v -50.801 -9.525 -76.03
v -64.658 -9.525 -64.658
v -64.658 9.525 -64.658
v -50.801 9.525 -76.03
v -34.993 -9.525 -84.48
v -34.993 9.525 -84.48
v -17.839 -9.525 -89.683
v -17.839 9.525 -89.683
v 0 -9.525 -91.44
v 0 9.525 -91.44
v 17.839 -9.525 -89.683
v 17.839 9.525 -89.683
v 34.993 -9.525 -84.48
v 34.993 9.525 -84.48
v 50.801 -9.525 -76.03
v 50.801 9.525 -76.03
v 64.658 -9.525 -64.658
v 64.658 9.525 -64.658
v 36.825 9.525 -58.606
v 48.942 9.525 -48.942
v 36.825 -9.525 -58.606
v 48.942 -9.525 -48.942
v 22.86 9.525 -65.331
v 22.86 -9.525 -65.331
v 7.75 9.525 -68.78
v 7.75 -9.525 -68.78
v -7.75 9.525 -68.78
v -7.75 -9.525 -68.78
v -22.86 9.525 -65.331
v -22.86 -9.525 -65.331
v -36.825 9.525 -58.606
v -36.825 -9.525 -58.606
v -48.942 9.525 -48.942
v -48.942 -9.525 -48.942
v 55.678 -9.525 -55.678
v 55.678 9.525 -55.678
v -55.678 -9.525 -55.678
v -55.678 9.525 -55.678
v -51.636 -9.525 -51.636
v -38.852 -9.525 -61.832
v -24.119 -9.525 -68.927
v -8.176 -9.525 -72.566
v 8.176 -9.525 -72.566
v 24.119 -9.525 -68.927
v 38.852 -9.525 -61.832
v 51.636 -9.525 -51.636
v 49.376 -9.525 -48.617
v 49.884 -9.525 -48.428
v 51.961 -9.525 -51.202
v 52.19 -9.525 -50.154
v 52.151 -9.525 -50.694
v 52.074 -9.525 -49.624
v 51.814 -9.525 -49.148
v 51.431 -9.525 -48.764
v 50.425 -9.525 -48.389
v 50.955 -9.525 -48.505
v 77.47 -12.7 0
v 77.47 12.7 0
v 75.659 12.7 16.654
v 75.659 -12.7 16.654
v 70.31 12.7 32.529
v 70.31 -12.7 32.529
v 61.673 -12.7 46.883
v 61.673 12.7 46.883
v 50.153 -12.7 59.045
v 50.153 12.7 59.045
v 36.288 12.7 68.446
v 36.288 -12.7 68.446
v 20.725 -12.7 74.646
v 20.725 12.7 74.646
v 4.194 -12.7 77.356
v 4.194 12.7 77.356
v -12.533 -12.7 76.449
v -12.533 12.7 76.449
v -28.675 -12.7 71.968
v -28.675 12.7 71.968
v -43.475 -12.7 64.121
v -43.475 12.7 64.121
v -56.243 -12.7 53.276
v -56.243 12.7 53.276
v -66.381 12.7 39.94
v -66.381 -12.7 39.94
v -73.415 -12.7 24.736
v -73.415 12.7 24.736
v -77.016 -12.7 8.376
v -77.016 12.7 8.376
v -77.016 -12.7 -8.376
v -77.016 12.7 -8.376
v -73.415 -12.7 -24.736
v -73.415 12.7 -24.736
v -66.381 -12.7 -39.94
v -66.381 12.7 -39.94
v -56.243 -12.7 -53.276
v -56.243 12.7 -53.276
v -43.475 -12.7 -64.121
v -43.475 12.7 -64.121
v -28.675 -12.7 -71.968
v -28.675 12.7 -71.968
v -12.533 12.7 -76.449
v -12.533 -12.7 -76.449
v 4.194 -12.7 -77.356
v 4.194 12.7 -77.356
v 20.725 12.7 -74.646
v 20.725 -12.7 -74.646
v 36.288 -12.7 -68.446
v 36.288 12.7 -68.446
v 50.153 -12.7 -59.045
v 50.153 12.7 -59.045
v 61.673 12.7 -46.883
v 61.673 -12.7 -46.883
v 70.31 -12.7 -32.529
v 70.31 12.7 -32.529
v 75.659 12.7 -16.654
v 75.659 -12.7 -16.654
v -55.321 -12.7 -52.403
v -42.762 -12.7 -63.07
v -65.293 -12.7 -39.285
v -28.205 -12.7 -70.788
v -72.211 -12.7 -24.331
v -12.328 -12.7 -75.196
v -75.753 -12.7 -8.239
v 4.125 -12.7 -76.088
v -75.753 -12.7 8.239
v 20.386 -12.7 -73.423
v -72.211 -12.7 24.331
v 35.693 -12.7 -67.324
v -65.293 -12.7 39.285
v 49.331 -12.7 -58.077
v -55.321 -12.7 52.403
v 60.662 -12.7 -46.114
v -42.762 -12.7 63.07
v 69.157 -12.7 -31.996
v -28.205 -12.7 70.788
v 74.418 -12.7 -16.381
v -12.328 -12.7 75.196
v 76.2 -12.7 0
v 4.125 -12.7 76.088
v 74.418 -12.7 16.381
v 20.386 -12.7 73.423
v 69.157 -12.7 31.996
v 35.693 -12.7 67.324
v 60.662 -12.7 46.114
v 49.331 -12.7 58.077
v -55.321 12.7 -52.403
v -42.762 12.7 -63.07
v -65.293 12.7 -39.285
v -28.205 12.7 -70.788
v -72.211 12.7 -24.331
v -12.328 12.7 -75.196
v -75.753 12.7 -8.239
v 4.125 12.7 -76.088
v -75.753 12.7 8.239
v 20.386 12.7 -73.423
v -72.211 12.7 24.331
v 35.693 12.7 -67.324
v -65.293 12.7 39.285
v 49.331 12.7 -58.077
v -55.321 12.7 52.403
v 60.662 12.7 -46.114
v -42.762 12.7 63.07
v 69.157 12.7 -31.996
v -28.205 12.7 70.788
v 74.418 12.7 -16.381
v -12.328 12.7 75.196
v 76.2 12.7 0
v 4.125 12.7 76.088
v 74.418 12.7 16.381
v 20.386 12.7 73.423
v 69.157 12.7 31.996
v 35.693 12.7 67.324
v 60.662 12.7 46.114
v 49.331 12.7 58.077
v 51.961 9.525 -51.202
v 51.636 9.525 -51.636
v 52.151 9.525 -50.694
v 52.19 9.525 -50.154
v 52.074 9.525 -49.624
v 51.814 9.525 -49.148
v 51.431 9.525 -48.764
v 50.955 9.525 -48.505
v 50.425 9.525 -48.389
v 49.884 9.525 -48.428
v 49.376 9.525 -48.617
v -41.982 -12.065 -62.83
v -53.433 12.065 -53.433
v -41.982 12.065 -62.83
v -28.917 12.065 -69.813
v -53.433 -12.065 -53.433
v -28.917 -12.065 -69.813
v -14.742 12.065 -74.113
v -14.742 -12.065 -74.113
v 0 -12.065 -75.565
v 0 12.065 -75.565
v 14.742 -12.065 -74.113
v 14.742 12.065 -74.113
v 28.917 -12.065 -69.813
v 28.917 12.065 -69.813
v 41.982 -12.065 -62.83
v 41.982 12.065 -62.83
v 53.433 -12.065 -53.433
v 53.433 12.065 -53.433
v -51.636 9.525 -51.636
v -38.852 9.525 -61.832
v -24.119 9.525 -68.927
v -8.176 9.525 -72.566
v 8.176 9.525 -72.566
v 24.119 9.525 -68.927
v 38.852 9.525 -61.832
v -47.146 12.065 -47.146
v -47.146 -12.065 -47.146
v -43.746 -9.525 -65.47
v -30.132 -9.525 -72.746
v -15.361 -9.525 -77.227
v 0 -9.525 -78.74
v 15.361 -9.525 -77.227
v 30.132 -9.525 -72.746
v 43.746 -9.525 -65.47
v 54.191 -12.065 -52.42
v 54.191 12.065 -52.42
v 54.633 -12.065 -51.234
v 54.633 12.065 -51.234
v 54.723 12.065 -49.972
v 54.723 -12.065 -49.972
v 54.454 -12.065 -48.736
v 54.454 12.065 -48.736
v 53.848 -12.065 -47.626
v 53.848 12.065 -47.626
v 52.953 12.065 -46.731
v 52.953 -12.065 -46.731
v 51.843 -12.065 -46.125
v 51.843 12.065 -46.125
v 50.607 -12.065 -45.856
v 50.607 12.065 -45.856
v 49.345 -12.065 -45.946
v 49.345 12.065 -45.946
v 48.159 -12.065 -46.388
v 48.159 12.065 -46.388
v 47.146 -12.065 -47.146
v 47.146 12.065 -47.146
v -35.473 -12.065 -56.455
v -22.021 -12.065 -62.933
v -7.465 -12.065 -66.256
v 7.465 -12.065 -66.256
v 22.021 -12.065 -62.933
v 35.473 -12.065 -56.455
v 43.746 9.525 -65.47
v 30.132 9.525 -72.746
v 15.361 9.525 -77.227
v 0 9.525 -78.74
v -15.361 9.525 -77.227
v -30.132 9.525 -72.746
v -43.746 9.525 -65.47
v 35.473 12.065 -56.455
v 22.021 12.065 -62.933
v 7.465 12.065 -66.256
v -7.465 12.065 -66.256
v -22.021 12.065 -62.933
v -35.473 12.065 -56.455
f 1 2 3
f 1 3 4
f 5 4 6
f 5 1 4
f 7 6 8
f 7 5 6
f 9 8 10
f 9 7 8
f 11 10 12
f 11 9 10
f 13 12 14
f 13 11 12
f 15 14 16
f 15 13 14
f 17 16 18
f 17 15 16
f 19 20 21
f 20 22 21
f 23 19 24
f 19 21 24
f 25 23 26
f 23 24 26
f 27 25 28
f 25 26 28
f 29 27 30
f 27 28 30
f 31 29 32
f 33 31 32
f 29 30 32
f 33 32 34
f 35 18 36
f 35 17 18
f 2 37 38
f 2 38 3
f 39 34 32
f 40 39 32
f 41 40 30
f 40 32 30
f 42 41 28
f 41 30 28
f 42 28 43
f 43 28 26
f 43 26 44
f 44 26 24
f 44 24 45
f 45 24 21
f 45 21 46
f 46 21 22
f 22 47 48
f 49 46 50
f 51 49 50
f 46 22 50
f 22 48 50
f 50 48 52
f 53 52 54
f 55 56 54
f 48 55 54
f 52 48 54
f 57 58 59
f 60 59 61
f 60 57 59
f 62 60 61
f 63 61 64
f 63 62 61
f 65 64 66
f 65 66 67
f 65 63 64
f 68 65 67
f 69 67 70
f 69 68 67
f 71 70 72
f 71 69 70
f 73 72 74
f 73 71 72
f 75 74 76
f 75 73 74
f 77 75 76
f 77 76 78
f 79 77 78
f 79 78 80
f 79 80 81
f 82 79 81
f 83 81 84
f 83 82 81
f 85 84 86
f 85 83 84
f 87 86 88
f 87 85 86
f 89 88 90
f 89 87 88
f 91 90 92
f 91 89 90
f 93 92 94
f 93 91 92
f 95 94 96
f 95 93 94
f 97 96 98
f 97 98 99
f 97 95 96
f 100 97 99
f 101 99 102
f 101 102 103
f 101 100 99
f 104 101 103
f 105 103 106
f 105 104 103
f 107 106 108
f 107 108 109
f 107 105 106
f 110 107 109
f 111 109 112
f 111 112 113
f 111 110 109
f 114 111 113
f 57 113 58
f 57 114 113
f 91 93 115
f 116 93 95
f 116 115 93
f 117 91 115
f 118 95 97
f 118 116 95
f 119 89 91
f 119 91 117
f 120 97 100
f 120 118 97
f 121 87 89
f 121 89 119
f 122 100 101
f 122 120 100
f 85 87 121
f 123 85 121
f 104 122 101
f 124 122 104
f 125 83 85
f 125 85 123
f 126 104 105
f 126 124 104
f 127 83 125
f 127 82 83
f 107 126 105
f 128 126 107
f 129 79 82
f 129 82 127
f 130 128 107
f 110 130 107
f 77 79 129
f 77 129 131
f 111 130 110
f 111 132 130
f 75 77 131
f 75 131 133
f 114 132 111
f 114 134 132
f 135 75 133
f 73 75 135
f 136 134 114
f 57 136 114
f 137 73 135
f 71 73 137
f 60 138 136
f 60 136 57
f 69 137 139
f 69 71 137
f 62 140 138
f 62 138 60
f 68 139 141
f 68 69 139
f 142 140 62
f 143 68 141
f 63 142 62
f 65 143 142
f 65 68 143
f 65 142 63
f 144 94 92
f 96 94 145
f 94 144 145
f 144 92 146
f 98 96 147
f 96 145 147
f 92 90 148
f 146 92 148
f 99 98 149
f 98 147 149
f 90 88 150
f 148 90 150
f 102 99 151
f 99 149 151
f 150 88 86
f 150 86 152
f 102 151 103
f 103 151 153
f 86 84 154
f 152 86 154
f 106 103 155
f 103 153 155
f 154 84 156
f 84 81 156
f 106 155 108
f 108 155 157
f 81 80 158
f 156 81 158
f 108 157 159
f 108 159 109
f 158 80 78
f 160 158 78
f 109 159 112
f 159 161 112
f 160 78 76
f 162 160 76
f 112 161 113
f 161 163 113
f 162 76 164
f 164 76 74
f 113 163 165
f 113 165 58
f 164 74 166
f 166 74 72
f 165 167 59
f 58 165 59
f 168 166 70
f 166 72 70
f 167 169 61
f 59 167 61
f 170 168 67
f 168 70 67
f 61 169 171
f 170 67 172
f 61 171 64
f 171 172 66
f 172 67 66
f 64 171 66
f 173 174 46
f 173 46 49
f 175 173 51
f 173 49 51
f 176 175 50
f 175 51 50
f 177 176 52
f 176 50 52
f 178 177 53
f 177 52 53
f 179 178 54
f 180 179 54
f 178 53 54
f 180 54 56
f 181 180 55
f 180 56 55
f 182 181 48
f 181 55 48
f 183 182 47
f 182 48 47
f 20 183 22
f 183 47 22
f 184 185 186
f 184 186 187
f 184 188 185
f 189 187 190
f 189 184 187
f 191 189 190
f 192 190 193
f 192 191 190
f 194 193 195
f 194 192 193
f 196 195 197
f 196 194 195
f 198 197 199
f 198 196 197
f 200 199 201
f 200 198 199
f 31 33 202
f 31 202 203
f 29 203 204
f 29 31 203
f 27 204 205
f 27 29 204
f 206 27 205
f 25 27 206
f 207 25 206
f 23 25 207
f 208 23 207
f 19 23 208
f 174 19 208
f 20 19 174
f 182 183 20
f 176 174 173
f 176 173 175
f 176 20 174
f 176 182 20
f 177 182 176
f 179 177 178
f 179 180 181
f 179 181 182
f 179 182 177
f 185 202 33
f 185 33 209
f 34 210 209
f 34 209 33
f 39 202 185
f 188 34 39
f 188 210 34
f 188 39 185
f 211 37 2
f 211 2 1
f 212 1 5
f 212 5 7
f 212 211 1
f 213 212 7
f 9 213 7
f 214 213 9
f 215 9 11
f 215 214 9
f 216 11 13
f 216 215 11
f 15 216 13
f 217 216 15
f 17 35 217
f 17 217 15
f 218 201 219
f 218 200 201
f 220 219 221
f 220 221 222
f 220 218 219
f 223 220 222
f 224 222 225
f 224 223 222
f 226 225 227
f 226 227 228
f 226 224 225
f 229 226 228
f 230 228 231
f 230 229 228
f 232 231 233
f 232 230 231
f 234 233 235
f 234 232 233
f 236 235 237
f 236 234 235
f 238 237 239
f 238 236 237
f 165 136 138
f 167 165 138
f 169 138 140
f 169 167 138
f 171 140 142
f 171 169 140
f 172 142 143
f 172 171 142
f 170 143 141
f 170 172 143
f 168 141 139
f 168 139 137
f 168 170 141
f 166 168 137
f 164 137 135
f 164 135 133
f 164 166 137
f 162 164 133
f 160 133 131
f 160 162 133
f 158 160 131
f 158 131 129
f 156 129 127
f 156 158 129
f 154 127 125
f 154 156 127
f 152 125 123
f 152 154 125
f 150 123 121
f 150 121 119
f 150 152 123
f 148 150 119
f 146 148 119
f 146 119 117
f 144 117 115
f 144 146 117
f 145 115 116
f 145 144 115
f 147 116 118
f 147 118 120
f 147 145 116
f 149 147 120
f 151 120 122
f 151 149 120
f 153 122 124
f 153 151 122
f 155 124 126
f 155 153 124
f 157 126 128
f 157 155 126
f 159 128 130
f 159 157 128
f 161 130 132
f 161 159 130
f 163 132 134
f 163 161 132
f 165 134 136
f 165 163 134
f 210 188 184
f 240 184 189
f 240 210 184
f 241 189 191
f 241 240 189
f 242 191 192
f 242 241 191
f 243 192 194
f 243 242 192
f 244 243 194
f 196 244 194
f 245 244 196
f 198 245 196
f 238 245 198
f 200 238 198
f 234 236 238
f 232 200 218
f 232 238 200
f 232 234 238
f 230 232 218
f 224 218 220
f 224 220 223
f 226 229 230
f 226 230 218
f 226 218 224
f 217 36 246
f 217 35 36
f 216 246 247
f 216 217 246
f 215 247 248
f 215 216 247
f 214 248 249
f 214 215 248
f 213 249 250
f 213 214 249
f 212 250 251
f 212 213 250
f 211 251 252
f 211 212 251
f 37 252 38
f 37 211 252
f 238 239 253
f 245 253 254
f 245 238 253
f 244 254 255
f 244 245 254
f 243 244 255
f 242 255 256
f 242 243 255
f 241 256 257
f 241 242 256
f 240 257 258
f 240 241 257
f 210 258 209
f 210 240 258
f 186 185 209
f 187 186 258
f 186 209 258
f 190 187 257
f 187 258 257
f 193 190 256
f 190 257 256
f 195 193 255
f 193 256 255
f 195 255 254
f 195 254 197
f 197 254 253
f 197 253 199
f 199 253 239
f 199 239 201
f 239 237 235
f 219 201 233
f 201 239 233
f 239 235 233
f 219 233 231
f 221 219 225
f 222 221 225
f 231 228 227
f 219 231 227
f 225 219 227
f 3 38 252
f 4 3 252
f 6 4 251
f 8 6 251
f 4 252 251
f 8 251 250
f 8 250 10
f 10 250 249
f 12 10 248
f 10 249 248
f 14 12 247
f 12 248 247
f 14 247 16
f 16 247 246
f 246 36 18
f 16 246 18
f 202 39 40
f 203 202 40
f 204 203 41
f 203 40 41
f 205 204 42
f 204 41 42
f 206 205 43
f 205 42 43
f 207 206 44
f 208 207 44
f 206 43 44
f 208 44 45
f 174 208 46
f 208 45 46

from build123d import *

# Parameters (mm, degrees)
F0_R     = 77.47
F0_R_2   = 76.2
F1_DEPTH = 12.7
F3_DEPTH = 9.525
F4_T     = 2.54


with BuildPart() as f1:
    # F0 (on Front) → F1 (new body, symmetric)
    with BuildSketch(Plane.XZ):
        Circle(F0_R)
        Circle(F0_R_2, mode=Mode.SUBTRACT)
    extrude(amount=F1_DEPTH, both=True)


with BuildPart() as f3:
    # F2 (on Front) → F3 (new body, symmetric)
    with BuildSketch(Plane.XZ):
        with BuildLine():
            ThreePointArc((48.9423958598, -48.9423958598), (0, -69.215), (-48.9423958598, -48.9423958598))
            Line((-48.9423958598, -48.9423958598), (-51.6364726961, -51.6364726961))
            ThreePointArc((-51.6364726961, -51.6364726961), (0, -73.025), (51.6364726961, -51.6364726961))
            ThreePointArc((51.6364726961, -51.6364726961), (51.6364726961, -48.9423958598), (48.9423958598, -48.9423958598))
        make_face()
    extrude(amount=F3_DEPTH, both=True)

    # F4
    f4_openings = [f3.faces().sort_by_distance(p)[0] for p in [
        (-50.289434, 0, -50.289434),
    ]]
    offset(amount=F4_T, openings=f4_openings, kind=Kind.INTERSECTION)


with BuildPart() as f3b:
    # F2 (on Front) → F3, piece 2 (new body, symmetric)
    with BuildSketch(Plane.XZ):
        with BuildLine():
            ThreePointArc((55.6775879506, -55.6775879506), (0, -78.74), (-55.6775879506, -55.6775879506))
            Line((-55.6775879506, -55.6775879506), (-64.6578440717, -64.6578440717))
            ThreePointArc((-64.6578440717, -64.6578440717), (0, -91.44), (64.6578440717, -64.6578440717))
            Line((64.6578440717, -64.6578440717), (55.6775879506, -55.6775879506))
        make_face()
    extrude(amount=F3_DEPTH, both=True)


solid = Compound([f1.part, f3.part, f3b.part])
